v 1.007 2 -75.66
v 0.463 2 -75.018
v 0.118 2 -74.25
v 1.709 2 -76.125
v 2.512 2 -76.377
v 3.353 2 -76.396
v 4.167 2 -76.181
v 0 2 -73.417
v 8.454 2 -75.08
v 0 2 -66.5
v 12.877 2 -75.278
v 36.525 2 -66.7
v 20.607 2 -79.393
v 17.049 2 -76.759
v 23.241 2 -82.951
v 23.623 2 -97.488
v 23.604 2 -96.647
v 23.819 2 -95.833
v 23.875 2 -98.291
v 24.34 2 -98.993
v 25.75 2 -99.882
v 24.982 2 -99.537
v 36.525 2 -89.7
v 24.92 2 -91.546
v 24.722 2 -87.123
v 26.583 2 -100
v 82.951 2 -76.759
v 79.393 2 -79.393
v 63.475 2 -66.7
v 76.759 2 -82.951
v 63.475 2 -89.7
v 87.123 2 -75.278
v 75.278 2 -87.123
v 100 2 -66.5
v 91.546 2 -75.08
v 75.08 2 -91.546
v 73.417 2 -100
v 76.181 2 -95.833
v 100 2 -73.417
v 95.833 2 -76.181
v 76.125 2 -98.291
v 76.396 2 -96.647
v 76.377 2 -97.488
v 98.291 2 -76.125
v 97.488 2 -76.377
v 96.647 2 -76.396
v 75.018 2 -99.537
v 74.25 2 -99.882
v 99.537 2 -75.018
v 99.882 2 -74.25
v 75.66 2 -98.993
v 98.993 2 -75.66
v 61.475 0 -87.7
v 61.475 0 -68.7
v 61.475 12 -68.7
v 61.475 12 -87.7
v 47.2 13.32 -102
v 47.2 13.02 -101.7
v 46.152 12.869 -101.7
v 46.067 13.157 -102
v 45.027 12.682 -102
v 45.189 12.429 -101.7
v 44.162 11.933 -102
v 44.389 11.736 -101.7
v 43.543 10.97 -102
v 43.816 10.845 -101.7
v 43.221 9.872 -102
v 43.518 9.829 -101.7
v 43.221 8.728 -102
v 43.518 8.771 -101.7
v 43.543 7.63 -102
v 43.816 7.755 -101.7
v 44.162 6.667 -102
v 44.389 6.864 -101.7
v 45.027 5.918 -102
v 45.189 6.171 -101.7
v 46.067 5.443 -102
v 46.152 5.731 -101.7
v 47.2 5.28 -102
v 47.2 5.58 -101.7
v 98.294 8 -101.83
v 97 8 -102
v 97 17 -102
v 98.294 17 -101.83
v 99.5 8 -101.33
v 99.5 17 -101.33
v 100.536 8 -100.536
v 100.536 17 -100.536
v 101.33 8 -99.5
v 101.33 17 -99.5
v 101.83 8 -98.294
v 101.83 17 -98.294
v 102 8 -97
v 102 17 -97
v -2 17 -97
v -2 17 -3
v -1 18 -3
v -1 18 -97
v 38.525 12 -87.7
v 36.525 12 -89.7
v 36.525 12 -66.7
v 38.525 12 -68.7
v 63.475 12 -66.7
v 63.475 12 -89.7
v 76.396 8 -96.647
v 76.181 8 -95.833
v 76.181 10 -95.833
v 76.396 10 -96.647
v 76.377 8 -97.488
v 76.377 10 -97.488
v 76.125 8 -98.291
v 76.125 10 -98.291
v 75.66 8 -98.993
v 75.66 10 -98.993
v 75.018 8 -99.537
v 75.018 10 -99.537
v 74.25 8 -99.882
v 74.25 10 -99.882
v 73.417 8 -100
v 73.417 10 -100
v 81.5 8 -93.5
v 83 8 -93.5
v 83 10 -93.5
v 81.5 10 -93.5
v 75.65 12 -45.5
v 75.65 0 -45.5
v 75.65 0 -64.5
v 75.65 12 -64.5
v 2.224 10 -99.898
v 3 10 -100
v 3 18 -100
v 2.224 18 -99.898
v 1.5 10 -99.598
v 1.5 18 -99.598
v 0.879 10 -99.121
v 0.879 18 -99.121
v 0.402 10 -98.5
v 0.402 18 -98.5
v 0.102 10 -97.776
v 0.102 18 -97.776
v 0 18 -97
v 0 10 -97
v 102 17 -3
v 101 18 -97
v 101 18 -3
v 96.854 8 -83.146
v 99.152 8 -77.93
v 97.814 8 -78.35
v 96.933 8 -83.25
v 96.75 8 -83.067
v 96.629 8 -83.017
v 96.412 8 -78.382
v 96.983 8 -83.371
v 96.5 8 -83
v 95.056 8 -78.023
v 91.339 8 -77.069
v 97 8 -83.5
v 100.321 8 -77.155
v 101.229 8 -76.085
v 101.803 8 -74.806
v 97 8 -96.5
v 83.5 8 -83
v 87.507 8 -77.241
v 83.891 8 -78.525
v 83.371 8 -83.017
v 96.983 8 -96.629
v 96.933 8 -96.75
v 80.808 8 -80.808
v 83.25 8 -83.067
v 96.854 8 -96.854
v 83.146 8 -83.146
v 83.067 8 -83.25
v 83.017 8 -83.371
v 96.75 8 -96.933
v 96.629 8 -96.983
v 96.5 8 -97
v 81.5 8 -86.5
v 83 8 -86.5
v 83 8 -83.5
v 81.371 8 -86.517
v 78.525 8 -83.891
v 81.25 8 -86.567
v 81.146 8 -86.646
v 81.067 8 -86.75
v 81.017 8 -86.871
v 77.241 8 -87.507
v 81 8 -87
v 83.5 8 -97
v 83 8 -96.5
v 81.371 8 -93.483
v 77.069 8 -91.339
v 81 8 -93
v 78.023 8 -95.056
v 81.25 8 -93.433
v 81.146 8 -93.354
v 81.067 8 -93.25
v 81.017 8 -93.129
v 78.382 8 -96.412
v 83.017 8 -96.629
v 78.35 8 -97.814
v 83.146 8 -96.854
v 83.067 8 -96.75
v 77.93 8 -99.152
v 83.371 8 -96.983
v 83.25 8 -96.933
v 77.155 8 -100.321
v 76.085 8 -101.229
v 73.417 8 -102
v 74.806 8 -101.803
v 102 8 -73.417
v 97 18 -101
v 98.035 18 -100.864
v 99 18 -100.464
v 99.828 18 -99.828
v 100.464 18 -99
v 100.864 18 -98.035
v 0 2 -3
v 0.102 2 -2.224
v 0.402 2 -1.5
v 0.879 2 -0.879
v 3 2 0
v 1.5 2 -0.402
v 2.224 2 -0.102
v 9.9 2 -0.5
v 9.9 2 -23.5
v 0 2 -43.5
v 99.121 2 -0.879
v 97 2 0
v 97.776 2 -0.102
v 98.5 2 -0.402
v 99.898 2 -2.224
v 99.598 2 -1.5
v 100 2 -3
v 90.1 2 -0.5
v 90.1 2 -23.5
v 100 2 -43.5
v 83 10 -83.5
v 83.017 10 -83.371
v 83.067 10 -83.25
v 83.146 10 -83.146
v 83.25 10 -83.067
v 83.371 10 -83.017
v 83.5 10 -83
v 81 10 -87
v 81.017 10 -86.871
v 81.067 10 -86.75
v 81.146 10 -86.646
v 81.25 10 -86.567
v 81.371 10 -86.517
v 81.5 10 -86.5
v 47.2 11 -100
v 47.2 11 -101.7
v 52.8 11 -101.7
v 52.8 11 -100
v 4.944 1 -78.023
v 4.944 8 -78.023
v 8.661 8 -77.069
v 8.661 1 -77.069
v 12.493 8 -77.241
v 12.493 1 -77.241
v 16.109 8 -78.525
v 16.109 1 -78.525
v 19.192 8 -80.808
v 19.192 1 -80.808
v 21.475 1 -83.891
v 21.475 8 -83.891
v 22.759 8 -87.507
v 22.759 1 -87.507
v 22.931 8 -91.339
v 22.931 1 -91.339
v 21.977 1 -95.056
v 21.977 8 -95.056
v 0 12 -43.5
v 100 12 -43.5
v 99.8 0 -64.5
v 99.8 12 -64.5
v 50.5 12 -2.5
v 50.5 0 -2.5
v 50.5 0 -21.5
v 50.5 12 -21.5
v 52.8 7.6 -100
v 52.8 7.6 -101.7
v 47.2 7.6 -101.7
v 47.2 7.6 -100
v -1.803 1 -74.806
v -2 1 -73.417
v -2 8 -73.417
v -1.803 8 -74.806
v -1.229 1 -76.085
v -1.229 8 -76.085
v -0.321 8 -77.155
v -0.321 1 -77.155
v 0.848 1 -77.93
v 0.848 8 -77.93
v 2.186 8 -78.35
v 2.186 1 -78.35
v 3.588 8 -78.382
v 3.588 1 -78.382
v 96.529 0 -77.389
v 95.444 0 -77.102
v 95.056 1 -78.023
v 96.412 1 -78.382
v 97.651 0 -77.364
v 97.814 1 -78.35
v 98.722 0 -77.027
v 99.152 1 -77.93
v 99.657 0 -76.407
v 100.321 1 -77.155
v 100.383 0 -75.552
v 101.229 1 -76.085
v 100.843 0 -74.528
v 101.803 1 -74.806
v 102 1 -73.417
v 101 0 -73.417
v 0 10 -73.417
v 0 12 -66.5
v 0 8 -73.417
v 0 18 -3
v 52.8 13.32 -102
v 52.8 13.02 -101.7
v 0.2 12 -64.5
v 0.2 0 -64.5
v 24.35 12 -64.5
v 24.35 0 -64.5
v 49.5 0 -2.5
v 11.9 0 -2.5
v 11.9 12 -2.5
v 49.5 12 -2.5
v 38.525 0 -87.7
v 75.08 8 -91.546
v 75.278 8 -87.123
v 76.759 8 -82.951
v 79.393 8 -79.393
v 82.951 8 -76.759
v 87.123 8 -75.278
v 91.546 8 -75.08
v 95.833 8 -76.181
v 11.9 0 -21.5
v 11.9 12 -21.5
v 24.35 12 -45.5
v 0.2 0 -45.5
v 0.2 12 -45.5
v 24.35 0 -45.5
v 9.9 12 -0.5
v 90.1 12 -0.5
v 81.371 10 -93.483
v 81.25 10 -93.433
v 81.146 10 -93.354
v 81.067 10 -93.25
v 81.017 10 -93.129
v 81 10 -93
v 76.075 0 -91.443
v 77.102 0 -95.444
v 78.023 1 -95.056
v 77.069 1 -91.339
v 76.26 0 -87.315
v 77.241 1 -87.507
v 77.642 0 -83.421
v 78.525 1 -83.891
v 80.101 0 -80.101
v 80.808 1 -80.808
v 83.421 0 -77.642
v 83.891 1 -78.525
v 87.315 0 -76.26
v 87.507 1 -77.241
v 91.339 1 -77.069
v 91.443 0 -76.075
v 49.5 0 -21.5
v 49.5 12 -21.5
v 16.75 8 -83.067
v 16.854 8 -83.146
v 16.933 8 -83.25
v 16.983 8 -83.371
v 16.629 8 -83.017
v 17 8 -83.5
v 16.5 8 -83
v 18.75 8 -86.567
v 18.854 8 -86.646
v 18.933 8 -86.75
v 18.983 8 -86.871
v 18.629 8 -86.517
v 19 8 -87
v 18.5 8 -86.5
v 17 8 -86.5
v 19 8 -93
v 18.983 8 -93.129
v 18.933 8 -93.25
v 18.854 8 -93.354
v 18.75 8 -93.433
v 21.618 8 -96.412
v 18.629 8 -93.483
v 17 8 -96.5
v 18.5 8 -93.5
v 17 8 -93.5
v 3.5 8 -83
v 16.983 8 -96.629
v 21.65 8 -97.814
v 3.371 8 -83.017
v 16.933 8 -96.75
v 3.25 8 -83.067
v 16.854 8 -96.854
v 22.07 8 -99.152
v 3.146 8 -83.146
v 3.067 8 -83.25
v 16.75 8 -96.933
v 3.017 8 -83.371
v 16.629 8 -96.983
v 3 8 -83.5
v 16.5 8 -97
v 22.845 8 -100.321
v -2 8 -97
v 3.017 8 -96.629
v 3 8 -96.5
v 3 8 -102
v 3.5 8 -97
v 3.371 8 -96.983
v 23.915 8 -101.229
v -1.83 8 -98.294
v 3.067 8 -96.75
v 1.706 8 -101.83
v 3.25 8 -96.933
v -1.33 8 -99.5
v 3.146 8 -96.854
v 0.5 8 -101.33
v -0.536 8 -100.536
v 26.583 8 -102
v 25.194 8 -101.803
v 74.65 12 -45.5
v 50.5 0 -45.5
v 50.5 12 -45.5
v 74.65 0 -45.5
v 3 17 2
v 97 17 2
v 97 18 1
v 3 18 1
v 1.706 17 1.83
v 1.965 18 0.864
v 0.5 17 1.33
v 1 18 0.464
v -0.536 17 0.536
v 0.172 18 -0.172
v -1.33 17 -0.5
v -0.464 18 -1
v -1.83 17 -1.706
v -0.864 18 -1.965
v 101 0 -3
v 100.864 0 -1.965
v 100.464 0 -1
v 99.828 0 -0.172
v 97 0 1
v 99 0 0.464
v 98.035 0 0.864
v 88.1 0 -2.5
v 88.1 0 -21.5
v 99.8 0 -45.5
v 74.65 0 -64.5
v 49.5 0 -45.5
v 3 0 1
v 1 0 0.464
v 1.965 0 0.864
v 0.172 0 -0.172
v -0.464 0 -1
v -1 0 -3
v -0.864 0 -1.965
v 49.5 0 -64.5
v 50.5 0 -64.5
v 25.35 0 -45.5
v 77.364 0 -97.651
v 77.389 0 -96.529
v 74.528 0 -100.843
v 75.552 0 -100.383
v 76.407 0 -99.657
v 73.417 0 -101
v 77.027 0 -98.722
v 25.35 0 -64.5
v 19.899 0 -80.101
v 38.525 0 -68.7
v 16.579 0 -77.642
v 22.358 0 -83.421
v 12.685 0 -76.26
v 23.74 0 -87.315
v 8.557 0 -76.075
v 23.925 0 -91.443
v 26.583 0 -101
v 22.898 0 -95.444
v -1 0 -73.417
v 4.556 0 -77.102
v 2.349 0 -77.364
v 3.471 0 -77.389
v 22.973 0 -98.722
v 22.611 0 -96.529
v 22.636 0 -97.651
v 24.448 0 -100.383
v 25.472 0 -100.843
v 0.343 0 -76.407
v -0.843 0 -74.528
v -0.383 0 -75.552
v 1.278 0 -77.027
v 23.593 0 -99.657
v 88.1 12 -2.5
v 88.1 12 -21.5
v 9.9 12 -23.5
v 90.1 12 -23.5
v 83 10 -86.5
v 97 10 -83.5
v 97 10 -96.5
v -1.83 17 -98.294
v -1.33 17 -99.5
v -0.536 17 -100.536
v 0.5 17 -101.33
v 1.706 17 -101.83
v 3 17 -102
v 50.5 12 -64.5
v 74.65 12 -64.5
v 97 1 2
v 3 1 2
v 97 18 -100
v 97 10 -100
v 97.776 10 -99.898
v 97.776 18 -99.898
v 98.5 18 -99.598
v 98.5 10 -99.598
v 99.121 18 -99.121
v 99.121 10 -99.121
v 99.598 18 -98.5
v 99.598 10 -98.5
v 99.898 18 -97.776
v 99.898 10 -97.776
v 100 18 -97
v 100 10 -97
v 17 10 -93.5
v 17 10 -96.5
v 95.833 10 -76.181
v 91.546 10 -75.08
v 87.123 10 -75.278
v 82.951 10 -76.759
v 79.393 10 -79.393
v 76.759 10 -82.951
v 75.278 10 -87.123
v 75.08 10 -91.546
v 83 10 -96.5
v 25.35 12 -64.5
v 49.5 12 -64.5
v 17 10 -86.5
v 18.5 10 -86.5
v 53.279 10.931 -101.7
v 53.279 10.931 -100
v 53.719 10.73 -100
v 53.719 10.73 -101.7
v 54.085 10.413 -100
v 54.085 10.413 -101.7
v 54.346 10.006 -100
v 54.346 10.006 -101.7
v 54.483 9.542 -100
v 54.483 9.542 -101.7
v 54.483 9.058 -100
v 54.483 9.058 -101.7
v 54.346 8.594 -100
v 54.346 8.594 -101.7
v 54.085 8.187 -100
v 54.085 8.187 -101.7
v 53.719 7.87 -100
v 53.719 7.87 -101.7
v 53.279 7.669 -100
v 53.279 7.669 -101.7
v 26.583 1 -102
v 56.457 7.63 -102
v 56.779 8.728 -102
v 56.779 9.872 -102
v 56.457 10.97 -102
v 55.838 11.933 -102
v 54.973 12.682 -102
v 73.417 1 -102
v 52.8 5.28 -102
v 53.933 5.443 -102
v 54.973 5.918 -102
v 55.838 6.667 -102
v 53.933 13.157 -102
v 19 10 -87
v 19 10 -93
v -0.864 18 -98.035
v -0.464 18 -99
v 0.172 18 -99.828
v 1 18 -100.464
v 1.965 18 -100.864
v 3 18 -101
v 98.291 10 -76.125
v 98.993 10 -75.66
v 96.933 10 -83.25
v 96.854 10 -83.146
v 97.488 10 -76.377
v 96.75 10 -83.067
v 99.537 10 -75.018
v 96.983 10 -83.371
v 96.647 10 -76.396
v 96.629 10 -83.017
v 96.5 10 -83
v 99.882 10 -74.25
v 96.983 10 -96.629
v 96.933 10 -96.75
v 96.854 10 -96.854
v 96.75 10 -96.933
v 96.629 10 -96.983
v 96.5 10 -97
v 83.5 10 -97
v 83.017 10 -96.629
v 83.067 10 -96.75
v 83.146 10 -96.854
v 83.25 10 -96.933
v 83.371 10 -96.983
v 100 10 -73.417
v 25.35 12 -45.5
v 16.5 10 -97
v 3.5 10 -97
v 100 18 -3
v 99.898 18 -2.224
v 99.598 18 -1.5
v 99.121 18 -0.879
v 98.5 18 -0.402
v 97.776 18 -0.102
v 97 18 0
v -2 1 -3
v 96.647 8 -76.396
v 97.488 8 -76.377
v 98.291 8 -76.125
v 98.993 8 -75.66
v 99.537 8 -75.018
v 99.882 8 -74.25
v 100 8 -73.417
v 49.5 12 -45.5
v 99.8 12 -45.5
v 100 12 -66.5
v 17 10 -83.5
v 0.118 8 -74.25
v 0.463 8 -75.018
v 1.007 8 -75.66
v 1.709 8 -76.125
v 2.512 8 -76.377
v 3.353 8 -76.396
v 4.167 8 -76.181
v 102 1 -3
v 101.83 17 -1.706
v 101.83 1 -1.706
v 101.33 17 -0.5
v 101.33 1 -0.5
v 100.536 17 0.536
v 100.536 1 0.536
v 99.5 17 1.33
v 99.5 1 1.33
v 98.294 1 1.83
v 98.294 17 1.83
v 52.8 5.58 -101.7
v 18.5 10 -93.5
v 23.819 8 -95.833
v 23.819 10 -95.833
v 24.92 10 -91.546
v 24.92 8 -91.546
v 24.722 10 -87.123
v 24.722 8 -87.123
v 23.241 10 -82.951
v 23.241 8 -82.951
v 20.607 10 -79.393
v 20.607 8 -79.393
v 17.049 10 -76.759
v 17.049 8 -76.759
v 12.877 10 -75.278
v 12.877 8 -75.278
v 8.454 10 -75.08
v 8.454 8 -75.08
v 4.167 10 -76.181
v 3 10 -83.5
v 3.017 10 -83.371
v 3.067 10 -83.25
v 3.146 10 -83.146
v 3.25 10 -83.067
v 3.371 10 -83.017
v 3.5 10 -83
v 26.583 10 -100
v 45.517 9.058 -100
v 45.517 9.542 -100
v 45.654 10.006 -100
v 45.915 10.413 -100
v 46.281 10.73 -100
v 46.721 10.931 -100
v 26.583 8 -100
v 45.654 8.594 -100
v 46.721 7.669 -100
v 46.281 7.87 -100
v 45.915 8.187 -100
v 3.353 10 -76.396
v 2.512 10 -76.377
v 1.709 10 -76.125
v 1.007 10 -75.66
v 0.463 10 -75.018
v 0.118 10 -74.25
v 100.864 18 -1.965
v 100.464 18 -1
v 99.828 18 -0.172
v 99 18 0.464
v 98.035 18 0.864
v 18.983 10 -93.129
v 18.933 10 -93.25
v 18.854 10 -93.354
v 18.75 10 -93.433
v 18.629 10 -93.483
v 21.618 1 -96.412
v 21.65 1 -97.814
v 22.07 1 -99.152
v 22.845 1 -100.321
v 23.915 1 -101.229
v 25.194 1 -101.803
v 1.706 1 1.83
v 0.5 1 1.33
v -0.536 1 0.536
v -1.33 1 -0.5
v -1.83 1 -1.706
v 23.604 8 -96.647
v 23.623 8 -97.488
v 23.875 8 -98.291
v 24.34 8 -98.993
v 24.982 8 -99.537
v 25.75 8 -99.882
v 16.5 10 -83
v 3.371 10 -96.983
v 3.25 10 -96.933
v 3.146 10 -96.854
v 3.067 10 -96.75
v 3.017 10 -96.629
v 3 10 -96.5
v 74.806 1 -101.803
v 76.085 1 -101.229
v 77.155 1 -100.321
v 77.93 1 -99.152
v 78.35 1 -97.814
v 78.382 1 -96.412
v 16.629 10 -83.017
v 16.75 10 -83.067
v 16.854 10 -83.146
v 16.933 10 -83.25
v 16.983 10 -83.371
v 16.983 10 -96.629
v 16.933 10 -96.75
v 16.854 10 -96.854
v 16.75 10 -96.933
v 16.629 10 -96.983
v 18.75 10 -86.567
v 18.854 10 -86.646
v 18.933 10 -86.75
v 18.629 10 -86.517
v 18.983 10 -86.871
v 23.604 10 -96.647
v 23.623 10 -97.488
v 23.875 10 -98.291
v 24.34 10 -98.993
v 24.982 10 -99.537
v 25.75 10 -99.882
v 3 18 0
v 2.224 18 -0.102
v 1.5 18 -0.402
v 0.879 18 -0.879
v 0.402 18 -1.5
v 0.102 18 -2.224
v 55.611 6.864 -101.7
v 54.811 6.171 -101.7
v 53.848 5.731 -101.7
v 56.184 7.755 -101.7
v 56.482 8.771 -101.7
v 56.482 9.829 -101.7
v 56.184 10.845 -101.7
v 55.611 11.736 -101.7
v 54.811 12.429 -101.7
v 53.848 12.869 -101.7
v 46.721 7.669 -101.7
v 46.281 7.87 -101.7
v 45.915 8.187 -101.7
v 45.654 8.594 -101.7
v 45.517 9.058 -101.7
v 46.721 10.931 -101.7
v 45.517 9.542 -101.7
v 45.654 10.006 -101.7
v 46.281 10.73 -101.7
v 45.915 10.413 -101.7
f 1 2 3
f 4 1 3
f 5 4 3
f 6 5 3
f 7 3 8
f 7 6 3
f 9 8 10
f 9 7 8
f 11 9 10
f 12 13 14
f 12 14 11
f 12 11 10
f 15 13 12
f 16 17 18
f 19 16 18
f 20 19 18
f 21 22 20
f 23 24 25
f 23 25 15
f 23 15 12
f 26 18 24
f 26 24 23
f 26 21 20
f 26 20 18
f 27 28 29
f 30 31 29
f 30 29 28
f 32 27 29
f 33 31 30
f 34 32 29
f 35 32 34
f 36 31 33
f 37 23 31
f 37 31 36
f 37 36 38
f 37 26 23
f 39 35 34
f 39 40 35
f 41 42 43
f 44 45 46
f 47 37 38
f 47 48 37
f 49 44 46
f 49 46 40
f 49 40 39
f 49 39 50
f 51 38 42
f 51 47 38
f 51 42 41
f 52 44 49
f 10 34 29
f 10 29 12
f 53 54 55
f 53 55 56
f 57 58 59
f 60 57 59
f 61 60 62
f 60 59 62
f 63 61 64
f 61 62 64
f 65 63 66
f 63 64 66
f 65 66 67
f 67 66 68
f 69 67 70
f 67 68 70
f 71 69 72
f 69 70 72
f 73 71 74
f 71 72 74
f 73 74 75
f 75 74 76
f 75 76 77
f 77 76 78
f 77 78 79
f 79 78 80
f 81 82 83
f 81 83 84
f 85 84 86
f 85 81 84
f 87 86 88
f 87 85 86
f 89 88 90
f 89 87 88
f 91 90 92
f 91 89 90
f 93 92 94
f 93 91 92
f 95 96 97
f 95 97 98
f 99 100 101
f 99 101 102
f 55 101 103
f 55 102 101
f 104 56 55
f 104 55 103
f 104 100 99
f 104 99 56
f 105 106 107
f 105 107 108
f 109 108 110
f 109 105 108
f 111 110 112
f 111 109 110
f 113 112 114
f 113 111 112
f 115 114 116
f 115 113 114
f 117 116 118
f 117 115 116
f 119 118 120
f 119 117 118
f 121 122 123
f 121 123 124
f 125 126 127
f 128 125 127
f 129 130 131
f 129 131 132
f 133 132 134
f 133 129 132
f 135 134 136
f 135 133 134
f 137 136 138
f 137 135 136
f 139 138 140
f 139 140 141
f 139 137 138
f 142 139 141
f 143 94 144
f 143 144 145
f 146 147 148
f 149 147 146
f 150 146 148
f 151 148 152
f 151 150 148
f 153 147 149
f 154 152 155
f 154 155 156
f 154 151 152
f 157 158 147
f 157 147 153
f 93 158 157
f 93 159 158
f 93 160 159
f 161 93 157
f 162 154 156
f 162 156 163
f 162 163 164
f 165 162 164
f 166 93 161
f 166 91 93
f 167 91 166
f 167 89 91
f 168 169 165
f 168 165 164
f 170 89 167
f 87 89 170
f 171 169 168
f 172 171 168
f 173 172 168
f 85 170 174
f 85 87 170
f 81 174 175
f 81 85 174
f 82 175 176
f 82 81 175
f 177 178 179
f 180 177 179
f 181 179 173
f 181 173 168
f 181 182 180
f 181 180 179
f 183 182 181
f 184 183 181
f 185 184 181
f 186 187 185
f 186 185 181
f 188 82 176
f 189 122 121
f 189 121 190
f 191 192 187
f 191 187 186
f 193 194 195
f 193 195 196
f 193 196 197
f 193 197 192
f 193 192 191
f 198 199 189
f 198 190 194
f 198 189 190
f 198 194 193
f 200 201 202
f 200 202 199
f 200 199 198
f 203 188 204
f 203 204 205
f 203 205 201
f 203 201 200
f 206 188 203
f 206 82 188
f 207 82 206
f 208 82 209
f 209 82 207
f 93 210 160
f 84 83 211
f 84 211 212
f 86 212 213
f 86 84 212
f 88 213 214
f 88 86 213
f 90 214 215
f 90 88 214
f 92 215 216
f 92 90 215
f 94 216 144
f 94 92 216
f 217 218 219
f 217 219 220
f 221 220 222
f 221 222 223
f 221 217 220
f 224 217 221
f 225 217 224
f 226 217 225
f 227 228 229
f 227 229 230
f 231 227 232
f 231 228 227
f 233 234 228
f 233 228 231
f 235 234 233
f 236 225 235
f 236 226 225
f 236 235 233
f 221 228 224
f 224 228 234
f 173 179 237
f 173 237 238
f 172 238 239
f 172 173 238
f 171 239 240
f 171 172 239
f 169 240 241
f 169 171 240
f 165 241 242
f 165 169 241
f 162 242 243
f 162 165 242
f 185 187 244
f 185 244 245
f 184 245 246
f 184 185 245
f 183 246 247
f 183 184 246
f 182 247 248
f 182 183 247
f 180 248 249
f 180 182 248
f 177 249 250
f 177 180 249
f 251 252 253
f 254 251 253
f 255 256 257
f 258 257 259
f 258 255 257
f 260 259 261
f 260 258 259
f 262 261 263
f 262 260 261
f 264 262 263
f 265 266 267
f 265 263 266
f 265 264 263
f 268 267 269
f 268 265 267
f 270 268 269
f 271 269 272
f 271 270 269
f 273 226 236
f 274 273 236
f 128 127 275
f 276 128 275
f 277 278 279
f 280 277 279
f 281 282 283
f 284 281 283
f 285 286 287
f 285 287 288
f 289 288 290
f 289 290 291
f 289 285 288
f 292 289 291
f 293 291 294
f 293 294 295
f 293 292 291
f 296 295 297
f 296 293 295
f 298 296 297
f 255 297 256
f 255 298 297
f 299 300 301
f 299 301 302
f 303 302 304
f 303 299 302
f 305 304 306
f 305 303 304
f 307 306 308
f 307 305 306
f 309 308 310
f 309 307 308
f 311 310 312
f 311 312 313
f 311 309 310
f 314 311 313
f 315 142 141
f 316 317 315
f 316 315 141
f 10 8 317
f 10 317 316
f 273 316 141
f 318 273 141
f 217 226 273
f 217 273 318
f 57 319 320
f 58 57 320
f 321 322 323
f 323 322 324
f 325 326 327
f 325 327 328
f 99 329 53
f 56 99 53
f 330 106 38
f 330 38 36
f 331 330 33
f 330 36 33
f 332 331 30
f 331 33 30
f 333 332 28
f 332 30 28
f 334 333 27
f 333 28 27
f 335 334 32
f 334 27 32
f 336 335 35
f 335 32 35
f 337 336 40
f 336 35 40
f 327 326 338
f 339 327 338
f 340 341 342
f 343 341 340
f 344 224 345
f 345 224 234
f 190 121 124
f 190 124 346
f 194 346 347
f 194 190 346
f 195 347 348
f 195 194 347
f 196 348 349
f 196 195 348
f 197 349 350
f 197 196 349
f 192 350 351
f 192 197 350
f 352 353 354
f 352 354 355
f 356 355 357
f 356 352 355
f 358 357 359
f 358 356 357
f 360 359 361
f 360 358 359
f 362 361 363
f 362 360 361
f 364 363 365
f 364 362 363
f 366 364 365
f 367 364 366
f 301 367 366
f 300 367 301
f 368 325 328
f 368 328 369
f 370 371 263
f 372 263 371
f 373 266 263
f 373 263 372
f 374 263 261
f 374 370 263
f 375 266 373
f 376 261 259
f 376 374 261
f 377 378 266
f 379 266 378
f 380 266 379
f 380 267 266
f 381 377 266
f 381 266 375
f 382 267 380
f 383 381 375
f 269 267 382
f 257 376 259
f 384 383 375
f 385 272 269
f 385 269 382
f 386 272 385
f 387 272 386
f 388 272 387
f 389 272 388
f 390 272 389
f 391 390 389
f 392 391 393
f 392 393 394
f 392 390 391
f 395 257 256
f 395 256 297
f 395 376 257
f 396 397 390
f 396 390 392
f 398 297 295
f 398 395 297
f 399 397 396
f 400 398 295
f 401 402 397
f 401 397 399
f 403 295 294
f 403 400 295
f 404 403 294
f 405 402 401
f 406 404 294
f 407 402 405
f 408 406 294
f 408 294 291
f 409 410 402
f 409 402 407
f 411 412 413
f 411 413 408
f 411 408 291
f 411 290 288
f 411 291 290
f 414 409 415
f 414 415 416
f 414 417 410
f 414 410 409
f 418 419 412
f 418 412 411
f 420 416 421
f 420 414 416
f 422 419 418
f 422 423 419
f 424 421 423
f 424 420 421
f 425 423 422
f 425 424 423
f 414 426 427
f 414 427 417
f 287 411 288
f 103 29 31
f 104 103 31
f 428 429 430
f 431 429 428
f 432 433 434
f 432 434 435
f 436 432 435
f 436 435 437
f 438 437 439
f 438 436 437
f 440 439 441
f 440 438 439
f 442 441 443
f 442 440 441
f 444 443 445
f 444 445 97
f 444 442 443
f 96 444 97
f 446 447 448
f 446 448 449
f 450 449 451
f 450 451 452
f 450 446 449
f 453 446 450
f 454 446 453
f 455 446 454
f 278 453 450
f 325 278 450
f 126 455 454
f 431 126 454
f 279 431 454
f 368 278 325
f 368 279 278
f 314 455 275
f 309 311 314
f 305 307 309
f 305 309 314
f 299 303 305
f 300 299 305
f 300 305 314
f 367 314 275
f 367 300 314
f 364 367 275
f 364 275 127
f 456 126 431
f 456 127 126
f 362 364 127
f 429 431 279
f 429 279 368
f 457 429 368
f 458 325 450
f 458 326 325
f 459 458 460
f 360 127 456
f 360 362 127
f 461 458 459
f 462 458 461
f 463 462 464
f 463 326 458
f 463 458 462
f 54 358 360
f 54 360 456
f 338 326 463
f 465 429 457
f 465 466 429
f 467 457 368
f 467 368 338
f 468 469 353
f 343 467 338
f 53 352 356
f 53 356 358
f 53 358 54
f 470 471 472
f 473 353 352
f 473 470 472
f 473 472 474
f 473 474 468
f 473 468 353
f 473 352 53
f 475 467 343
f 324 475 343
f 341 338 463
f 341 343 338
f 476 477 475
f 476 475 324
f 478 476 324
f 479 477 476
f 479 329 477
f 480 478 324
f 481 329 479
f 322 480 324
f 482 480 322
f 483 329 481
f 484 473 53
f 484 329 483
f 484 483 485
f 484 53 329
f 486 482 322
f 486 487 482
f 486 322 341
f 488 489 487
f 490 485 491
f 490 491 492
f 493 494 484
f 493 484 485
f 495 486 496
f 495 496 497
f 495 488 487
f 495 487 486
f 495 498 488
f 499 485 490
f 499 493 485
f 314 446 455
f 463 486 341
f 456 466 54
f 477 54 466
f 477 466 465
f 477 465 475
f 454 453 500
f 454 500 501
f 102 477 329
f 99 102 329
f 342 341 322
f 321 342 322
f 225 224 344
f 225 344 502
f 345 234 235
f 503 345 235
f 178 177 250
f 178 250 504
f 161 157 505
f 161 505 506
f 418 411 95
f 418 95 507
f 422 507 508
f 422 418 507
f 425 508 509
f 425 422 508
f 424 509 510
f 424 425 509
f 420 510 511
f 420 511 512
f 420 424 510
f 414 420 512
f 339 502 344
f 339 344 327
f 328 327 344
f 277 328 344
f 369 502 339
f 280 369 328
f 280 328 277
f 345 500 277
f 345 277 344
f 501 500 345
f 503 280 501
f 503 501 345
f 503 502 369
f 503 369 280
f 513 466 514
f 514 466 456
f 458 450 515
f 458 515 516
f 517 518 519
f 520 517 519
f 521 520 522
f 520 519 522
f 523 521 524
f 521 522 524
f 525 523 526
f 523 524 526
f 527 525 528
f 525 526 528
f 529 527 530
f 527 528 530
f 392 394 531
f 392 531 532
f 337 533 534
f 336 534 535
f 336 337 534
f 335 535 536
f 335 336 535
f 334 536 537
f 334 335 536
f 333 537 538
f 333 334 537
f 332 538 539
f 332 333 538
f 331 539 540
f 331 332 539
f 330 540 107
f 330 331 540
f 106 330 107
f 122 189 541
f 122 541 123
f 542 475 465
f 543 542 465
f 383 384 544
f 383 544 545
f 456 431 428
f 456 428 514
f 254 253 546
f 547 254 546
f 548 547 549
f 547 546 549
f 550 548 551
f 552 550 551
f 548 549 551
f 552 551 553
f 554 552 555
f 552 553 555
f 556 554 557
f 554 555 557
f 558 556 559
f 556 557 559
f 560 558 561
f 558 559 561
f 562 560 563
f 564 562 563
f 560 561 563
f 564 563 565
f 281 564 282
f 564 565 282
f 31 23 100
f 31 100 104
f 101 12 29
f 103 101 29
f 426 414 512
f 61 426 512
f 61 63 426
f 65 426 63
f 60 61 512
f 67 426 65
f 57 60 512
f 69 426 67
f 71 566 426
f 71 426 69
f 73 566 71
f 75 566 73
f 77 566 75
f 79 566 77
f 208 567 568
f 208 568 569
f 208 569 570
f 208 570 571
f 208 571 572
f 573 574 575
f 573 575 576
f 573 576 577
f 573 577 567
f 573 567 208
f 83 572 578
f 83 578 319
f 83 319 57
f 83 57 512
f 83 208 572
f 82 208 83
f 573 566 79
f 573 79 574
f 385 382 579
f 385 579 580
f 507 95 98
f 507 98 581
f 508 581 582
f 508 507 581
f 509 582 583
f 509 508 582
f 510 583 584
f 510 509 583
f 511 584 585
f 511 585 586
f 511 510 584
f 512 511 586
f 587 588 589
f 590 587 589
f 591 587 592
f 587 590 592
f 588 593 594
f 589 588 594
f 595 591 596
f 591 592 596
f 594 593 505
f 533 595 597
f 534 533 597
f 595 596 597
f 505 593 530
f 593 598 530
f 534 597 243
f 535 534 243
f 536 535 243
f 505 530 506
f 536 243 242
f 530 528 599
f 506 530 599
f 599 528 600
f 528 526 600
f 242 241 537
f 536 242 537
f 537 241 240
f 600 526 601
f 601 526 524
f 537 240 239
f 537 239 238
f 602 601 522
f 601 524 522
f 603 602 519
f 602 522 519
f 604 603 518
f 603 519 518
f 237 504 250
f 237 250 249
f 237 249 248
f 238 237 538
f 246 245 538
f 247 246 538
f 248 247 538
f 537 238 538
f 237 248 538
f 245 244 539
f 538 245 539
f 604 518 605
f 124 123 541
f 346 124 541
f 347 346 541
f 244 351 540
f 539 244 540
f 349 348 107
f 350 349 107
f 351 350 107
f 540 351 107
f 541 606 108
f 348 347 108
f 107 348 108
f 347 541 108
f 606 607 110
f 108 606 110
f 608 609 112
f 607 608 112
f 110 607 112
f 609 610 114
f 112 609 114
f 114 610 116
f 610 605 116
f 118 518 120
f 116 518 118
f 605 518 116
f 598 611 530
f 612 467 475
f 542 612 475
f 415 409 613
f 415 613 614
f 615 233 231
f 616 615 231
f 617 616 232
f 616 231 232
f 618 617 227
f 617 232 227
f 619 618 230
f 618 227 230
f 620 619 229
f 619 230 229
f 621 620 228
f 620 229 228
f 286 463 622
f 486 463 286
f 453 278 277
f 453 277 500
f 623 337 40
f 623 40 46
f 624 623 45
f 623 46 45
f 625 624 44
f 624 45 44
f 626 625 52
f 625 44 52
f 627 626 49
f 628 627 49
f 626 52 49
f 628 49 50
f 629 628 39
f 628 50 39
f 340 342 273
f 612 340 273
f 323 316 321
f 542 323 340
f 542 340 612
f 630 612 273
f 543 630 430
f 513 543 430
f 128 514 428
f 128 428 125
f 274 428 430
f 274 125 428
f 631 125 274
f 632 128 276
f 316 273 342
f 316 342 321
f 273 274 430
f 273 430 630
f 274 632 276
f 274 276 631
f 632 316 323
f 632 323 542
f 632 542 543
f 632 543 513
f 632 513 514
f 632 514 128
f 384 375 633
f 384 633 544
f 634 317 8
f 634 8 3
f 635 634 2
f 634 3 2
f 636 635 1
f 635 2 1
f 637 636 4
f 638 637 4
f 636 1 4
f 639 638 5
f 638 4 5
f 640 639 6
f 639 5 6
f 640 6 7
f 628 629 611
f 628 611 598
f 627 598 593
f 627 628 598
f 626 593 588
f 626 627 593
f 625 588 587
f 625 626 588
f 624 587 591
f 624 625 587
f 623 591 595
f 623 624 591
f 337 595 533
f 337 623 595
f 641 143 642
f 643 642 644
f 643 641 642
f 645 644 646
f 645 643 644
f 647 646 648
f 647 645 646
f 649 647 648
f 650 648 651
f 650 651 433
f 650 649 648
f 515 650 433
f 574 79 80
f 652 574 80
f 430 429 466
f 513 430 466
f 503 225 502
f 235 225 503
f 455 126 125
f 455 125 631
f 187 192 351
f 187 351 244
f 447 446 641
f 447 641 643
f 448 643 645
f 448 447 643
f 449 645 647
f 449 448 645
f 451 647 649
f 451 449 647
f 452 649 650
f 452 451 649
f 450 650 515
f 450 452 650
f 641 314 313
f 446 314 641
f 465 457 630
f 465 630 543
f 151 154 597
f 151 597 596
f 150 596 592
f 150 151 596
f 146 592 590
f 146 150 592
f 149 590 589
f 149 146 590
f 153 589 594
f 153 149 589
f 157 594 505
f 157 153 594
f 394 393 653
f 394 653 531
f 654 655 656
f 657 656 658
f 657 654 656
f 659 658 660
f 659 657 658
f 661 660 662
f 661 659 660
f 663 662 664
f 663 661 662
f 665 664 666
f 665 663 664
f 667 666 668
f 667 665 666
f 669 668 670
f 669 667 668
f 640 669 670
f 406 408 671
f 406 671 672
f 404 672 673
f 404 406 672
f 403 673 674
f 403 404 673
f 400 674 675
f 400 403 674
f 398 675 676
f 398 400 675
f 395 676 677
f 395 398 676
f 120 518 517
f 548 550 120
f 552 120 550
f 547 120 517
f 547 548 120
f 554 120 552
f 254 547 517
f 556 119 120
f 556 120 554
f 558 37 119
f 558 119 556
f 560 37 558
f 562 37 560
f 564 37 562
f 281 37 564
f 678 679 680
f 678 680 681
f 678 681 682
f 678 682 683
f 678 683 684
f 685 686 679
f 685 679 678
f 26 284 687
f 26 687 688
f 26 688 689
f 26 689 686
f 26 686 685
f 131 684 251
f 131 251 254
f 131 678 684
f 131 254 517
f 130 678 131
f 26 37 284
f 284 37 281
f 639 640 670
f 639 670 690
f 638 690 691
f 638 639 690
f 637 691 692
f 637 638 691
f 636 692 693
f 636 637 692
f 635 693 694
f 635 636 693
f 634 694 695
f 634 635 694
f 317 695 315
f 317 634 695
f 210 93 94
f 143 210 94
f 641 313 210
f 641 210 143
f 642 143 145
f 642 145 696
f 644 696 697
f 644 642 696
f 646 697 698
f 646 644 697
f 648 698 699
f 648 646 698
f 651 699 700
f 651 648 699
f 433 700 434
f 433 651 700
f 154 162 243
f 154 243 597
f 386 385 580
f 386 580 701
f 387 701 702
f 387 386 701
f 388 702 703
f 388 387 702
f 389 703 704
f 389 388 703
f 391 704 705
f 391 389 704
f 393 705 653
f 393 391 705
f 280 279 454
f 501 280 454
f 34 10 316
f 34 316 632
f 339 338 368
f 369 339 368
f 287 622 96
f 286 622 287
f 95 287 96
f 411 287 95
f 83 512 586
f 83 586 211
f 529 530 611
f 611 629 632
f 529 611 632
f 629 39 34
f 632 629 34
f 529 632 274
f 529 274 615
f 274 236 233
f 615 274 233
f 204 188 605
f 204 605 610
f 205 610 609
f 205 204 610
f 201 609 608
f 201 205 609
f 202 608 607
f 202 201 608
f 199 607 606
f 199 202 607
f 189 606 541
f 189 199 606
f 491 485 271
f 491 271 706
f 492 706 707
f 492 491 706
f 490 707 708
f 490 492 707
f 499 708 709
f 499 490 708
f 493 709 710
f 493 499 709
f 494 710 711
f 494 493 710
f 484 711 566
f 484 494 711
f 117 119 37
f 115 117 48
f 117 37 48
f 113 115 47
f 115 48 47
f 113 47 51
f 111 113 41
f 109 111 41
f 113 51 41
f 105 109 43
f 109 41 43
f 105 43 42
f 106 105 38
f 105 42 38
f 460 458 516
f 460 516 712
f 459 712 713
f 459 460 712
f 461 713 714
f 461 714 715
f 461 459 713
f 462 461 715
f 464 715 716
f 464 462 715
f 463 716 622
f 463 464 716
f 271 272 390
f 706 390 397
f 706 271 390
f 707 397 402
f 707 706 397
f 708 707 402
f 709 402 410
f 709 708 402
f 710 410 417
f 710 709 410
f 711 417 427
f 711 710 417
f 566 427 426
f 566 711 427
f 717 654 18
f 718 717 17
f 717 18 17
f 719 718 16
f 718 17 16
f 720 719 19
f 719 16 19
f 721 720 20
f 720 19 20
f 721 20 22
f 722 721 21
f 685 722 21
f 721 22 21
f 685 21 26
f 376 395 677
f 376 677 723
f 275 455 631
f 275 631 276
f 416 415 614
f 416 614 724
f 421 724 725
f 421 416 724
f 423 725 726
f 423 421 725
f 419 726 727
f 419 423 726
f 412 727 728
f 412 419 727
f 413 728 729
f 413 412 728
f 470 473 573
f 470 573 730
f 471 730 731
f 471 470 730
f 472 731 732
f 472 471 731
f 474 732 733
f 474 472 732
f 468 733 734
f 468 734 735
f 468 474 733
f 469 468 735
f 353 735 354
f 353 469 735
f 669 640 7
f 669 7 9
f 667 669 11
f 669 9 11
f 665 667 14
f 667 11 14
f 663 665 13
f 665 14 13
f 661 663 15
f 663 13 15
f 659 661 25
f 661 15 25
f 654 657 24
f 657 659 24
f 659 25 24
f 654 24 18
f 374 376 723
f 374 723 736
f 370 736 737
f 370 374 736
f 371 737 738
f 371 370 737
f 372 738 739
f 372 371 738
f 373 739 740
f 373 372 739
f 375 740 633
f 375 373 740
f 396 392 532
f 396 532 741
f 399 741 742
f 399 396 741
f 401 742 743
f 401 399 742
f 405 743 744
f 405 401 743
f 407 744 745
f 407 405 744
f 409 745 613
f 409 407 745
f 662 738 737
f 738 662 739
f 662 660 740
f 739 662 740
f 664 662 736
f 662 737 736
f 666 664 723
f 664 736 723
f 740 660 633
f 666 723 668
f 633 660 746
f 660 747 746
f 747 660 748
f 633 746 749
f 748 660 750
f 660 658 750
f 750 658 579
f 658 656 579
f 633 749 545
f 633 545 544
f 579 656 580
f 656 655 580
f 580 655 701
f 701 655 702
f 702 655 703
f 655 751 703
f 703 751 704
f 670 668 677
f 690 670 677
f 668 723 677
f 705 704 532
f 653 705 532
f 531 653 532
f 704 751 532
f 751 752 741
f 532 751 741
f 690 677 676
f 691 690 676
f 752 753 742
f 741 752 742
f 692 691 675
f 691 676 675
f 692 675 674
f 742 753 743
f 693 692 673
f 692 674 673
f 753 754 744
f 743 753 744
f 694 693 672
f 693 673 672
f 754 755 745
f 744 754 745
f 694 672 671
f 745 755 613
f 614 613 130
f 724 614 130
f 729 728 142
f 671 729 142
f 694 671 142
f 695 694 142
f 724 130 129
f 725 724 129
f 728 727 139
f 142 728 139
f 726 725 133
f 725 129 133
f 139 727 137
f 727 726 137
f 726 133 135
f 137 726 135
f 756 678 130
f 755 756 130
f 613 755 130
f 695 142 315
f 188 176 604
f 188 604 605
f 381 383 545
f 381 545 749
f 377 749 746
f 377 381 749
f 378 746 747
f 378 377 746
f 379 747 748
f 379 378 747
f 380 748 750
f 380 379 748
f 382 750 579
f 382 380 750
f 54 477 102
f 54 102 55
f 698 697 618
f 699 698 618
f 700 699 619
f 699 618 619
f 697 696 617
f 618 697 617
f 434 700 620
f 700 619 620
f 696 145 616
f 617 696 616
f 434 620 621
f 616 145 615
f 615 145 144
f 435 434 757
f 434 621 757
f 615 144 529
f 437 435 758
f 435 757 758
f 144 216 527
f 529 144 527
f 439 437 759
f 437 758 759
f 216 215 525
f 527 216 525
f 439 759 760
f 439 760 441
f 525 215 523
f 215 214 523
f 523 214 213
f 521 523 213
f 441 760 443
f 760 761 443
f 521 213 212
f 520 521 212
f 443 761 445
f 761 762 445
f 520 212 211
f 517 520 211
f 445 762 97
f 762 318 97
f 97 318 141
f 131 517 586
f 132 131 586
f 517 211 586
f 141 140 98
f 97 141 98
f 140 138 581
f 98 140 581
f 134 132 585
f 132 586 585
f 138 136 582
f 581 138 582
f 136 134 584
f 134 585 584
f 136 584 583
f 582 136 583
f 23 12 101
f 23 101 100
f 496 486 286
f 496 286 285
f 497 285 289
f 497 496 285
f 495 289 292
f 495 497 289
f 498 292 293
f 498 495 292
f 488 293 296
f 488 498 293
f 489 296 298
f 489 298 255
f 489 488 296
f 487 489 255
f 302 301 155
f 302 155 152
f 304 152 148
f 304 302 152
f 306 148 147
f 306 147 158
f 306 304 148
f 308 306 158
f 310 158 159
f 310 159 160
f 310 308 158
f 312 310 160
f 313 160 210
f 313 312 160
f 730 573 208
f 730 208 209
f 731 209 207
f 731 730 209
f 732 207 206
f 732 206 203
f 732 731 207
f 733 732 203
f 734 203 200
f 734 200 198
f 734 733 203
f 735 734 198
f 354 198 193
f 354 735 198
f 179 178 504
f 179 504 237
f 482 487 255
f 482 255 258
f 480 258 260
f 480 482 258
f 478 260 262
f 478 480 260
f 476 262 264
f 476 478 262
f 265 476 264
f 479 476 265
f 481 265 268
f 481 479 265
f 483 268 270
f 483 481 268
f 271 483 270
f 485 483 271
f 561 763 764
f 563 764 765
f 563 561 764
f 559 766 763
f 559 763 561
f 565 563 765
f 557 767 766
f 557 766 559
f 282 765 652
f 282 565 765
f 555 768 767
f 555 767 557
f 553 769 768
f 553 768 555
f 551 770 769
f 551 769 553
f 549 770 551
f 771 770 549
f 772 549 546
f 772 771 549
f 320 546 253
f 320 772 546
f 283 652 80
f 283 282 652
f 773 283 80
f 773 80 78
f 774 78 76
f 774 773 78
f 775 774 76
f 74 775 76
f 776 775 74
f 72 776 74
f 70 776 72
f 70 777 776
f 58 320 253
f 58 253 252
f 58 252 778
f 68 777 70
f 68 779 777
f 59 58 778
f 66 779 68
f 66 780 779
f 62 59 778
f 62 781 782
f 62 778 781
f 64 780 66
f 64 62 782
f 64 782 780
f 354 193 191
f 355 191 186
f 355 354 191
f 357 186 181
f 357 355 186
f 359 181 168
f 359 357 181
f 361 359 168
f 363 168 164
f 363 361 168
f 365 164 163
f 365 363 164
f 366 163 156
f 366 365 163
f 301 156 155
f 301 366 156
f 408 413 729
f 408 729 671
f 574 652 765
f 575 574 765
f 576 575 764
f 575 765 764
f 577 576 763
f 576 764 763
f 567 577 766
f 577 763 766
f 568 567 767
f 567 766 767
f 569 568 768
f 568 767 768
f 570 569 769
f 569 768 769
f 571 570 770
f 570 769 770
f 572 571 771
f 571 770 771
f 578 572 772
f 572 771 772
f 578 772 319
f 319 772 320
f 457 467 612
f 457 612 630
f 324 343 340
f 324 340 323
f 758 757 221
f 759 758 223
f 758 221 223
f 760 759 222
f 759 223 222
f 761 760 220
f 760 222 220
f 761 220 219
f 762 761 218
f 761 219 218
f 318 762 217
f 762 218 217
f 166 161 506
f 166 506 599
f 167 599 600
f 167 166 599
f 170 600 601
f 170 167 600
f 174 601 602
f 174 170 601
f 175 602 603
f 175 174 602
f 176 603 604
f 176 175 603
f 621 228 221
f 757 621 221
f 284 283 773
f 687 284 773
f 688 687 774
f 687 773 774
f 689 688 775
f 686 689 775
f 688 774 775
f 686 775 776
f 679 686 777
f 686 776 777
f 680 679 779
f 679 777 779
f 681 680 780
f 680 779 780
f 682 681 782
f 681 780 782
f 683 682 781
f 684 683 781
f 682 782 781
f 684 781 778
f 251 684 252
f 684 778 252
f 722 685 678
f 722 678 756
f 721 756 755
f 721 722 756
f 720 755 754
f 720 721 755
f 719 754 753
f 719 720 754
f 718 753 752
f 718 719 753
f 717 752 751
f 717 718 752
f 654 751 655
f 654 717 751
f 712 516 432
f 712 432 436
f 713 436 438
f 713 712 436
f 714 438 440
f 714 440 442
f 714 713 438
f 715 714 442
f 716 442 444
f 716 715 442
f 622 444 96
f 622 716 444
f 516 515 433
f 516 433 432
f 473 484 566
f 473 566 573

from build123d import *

# Parameters (mm, degrees)
SKETCH_1_W            = 22.95
SKETCH_1_H            = 19
SKETCH_1_W_2          = 37.6
SKETCH_1_W_3          = 24.15
EXTRUDE_7_DEPTH       = 2
SKETCH_4_R            = 15
CUT_EXTRUDE_1_DEPTH   = 18
FILLET_1_R            = 3
FILLET_2_R            = 3
SKETCH_1_6_W          = 26.95
SKETCH_1_6_H          = 23
SKETCH_1_6_W_2        = 22.95
SKETCH_1_6_H_2        = 19
EXTRUDE_3_DEPTH       = 12
EXTRUDE_4_OUTLINE_W   = 103.6
EXTRUDE_4_OUTLINE_H   = 23
EXTRUDE_4_OUTLINE_W_2 = 23.15
EXTRUDE_4_OUTLINE_H_2 = 19
EXTRUDE_4_OUTLINE_W_3 = 22.15
EXTRUDE_4_DEPTH       = 12
EXTRUDE_5_OUTLINE_W   = 80.2
EXTRUDE_5_OUTLINE_H   = 23
EXTRUDE_5_OUTLINE_W_2 = 36.6
EXTRUDE_5_OUTLINE_H_2 = 19
EXTRUDE_5_DEPTH       = 12
EXTRUDE_START         = -2
EXTRUDE_7_2_DEPTH     = 18
SKETCH_11_W           = 28.583123952
SKETCH_11_H           = 28.583123952
CUT_EXTRUDE_8_DEPTH   = 10
EXTRUDE_8_DEPTH       = 2
EXTRUDE_9_DEPTH       = 2
EXTRUDE_12_DEPTH      = 8
CHAMFER_1_SIZE        = 1
CHAMFER_2_SIZE        = 1
CUT_EXTRUDE_9_DEPTH   = 2
CUT_EXTRUDE_10_DEPTH  = 0.3
CHAMFER_3_SIZE        = 0.32
SKETCH_1_11_W         = 37.6
SKETCH_1_11_H         = 19
SKETCH_1_11_W_2       = 24.15
CUT_EXTRUDE_12_DEPTH  = 12


# Read off the part's stored shape, not the designer's step: 拉伸-薄壁4, 拉伸-薄壁5
with BuildPart() as part:
    # 草图1 → Extrude 7 (new body)
    with BuildSketch(Plane(origin=(0, 0, 0), x_dir=(1, 0, 0), z_dir=(0, 1, 0))):
        with BuildLine():
            Line((3, 0), (97, 0))
            ThreePointArc((97, 0), (99.121320344, 0.878679656), (100, 3))
            Line((100, 3), (100, 97))
            ThreePointArc((100, 97), (99.121320344, 99.121320344), (97, 100))
            Line((97, 100), (3, 100))
            ThreePointArc((3, 100), (0.878679656, 99.121320344), (0, 97))
            Line((0, 97), (0, 3))
            ThreePointArc((0, 3), (0.878679656, 0.878679656), (3, 0))
        make_face()
        with Locations((50, 78.2)):
            Rectangle(SKETCH_1_W, SKETCH_1_H, mode=Mode.SUBTRACT)
        with Locations((30.7, 12)):
            Rectangle(SKETCH_1_W_2, SKETCH_1_H, mode=Mode.SUBTRACT)
        with Locations((87.725, 55)):
            Rectangle(SKETCH_1_W_3, SKETCH_1_H, mode=Mode.SUBTRACT)
        with Locations((37.425, 55)):
            Rectangle(SKETCH_1_W_3, SKETCH_1_H, mode=Mode.SUBTRACT)
        with Locations((62.575, 55)):
            Rectangle(SKETCH_1_W_3, SKETCH_1_H, mode=Mode.SUBTRACT)
        with Locations((12.275, 55)):
            Rectangle(SKETCH_1_W_3, SKETCH_1_H, mode=Mode.SUBTRACT)
        with Locations((69.3, 12)):
            Rectangle(SKETCH_1_W_2, SKETCH_1_H, mode=Mode.SUBTRACT)
    extrude(amount=EXTRUDE_7_DEPTH)

    # 草图4 → 切除-拉伸1 (cut)
    with BuildSketch(Plane(origin=(0, 2, 0), x_dir=(1, 0, 0), z_dir=(0, 1, 0))):
        with Locations((10, 90)):
            Circle(SKETCH_4_R)
        with Locations((90, 90)):
            Circle(SKETCH_4_R)
    extrude(amount=-CUT_EXTRUDE_1_DEPTH, mode=Mode.SUBTRACT)

    # 圆角1
    fillet_1_edges = [part.edges().sort_by_distance(p)[0] for p in [
        (21.180339887, 1, -100),
        (0, 1, -78.819660113),
    ]]
    fillet(fillet_1_edges, radius=FILLET_1_R)

    # 圆角2
    fillet_2_edges = [part.edges().sort_by_distance(p)[0] for p in [
        (78.819660113, 1, -100),
        (100, 1, -78.819660113),
    ]]
    fillet(fillet_2_edges, radius=FILLET_2_R)

    # 草图1<6> → 拉伸-薄壁3 (add)
    with BuildSketch(Plane(origin=(0, 0, 0), x_dir=(1, 0, 0), z_dir=(0, 1, 0))):
        with Locations((50, 78.2)):
            Rectangle(SKETCH_1_6_W, SKETCH_1_6_H)
        with Locations((50, 78.2)):
            Rectangle(SKETCH_1_6_W_2, SKETCH_1_6_H_2, mode=Mode.SUBTRACT)
    extrude(amount=EXTRUDE_3_DEPTH)

    # 拉伸-薄壁4 outline → 拉伸-薄壁4 (add)
    with BuildSketch(Plane(origin=(0, 0, 0), x_dir=(1, 0, 0), z_dir=(0, 1, 0))):
        with Locations((50, 55)):
            Rectangle(EXTRUDE_4_OUTLINE_W, EXTRUDE_4_OUTLINE_H)
        with Locations((11.775, 55)):
            Rectangle(EXTRUDE_4_OUTLINE_W_2, EXTRUDE_4_OUTLINE_H_2, mode=Mode.SUBTRACT)
        with Locations((37.425, 55)):
            Rectangle(EXTRUDE_4_OUTLINE_W_3, EXTRUDE_4_OUTLINE_H_2, mode=Mode.SUBTRACT)
        with Locations((62.575, 55)):
            Rectangle(EXTRUDE_4_OUTLINE_W_3, EXTRUDE_4_OUTLINE_H_2, mode=Mode.SUBTRACT)
        with Locations((88.225, 55)):
            Rectangle(EXTRUDE_4_OUTLINE_W_2, EXTRUDE_4_OUTLINE_H_2, mode=Mode.SUBTRACT)
    extrude(amount=EXTRUDE_4_DEPTH)

    # 拉伸-薄壁5 outline → 拉伸-薄壁5 (add)
    with BuildSketch(Plane(origin=(0, 0, 0), x_dir=(1, 0, 0), z_dir=(0, 1, 0))):
        with Locations((50, 12)):
            Rectangle(EXTRUDE_5_OUTLINE_W, EXTRUDE_5_OUTLINE_H)
        with Locations((30.2, 12)):
            Rectangle(EXTRUDE_5_OUTLINE_W_2, EXTRUDE_5_OUTLINE_H_2, mode=Mode.SUBTRACT)
        with Locations((69.8, 12)):
            Rectangle(EXTRUDE_5_OUTLINE_W_2, EXTRUDE_5_OUTLINE_H_2, mode=Mode.SUBTRACT)
    extrude(amount=EXTRUDE_5_DEPTH)

    # 草图10 → Extrude 7 2 (add)
    with BuildSketch(Plane(origin=(0, 2, 0), x_dir=(1, 0, 0), z_dir=(0, 1, 0)).offset(EXTRUDE_START)):
        with BuildLine():
            Line((-2, 3), (-2, 73.416876048))
            ThreePointArc((-2, 73.416876048), (0.236146008, 77.583542715), (4.944444444, 78.023299368))
            ThreePointArc((4.944444444, 78.023299368), (19.192388155, 80.807611845), (21.976700632, 95.055555556))
            ThreePointArc((21.976700632, 95.055555556), (22.416457285, 99.763853992), (26.583123952, 102))
            Line((26.583123952, 102), (73.416876048, 102))
            ThreePointArc((73.416876048, 102), (77.583542715, 99.763853992), (78.023299368, 95.055555556))
            ThreePointArc((78.023299368, 95.055555556), (80.807611845, 80.807611845), (95.055555556, 78.023299368))
            ThreePointArc((95.055555556, 78.023299368), (99.763853992, 77.583542715), (102, 73.416876048))
            Line((102, 73.416876048), (102, 3))
            ThreePointArc((102, 3), (100.535533906, -0.535533906), (97, -2))
            Line((97, -2), (3, -2))
            ThreePointArc((3, -2), (-0.535533906, -0.535533906), (-2, 3))
        make_face()
        with BuildLine():
            Line((0, 3), (0, 73.416876048))
            ThreePointArc((0, 73.416876048), (1.341687605, 75.916876048), (4.166666667, 76.18073004))
            ThreePointArc((4.166666667, 76.18073004), (20.606601718, 79.393398282), (23.81926996, 95.833333333))
            ThreePointArc((23.81926996, 95.833333333), (24.083123952, 98.658312395), (26.583123952, 100))
            Line((26.583123952, 100), (73.416876048, 100))
            ThreePointArc((73.416876048, 100), (75.916876048, 98.658312395), (76.18073004, 95.833333333))
            ThreePointArc((76.18073004, 95.833333333), (79.393398282, 79.393398282), (95.833333333, 76.18073004))
            ThreePointArc((95.833333333, 76.18073004), (98.658312395, 75.916876048), (100, 73.416876048))
            Line((100, 73.416876048), (100, 3))
            ThreePointArc((100, 3), (99.121320344, 0.878679656), (97, 0))
            Line((97, 0), (3, 0))
            ThreePointArc((3, 0), (0.878679656, 0.878679656), (0, 3))
        make_face(mode=Mode.SUBTRACT)
    extrude(amount=EXTRUDE_7_2_DEPTH)

    # 草图11 → 切除-拉伸8 (cut)
    with BuildSketch(Plane(origin=(0, 18, 0), x_dir=(1, 0, 0), z_dir=(0, 1, 0))):
        with Locations((87.708438024, 87.708438024)):
            Rectangle(SKETCH_11_W, SKETCH_11_H)
        with Locations((12.291561976, 87.708438024)):
            Rectangle(SKETCH_11_W, SKETCH_11_H)
    extrude(amount=-CUT_EXTRUDE_8_DEPTH, mode=Mode.SUBTRACT)

    # 草图13 → 凸台-拉伸8 (add)
    with BuildSketch(Plane(origin=(0, 8, 0), x_dir=(1, 0, 0), z_dir=(0, 1, 0))):
        with BuildLine():
            Line((26.583123952, 102), (26.583123952, 100))
            ThreePointArc((26.583123952, 100), (24.083123952, 98.658312395), (23.81926996, 95.833333333))
            ThreePointArc((23.81926996, 95.833333333), (20.606601718, 79.393398282), (4.166666667, 76.18073004))
            ThreePointArc((4.166666667, 76.18073004), (1.341687605, 75.916876048), (0, 73.416876048))
            Line((0, 73.416876048), (-2, 73.416876048))
            Line((-2, 73.416876048), (-2, 97))
            ThreePointArc((-2, 97), (-0.535533906, 100.535533906), (3, 102))
            Line((3, 102), (26.583123952, 102))
        make_face()
        with BuildLine():
            Line((18.5, 93.5), (17, 93.5))
            Line((17, 93.5), (17, 96.5))
            ThreePointArc((17, 96.5), (16.853553391, 96.853553391), (16.5, 97))
            Line((16.5, 97), (3.5, 97))
            ThreePointArc((3.5, 97), (3.146446609, 96.853553391), (3, 96.5))
            Line((3, 96.5), (3, 83.5))
            ThreePointArc((3, 83.5), (3.146446609, 83.146446609), (3.5, 83))
            Line((3.5, 83), (16.5, 83))
            ThreePointArc((16.5, 83), (16.853553391, 83.146446609), (17, 83.5))
            Line((17, 83.5), (17, 86.5))
            Line((17, 86.5), (18.5, 86.5))
            ThreePointArc((18.5, 86.5), (18.853553391, 86.646446609), (19, 87))
            Line((19, 87), (19, 93))
            ThreePointArc((19, 93), (18.853553391, 93.353553391), (18.5, 93.5))
        make_face(mode=Mode.SUBTRACT)
    extrude(amount=EXTRUDE_8_DEPTH)

    # 草图15 → 凸台-拉伸9 (add)
    with BuildSketch(Plane(origin=(0, 8, 0), x_dir=(1, 0, 0), z_dir=(0, 1, 0))):
        with BuildLine():
            Line((73.416876048, 102), (97, 102))
            ThreePointArc((97, 102), (100.535533906, 100.535533906), (102, 97))
            Line((102, 97), (102, 73.416876048))
            Line((102, 73.416876048), (100, 73.416876048))
            ThreePointArc((100, 73.416876048), (98.658312395, 75.916876048), (95.833333333, 76.18073004))
            ThreePointArc((95.833333333, 76.18073004), (79.393398282, 79.393398282), (76.18073004, 95.833333333))
            ThreePointArc((76.18073004, 95.833333333), (75.916876048, 98.658312395), (73.416876048, 100))
            Line((73.416876048, 100), (73.416876048, 102))
        make_face()
        with BuildLine():
            Line((83, 86.5), (83, 83.5))
            ThreePointArc((83, 83.5), (83.146446609, 83.146446609), (83.5, 83))
            Line((83.5, 83), (96.5, 83))
            ThreePointArc((96.5, 83), (96.853553391, 83.146446609), (97, 83.5))
            Line((97, 83.5), (97, 96.5))
            ThreePointArc((97, 96.5), (96.853553391, 96.853553391), (96.5, 97))
            Line((96.5, 97), (83.5, 97))
            ThreePointArc((83.5, 97), (83.146446609, 96.853553391), (83, 96.5))
            Line((83, 96.5), (83, 93.5))
            Line((83, 93.5), (81.5, 93.5))
            ThreePointArc((81.5, 93.5), (81.146446609, 93.353553391), (81, 93))
            Line((81, 93), (81, 87))
            ThreePointArc((81, 87), (81.146446609, 86.646446609), (81.5, 86.5))
            Line((81.5, 86.5), (83, 86.5))
        make_face(mode=Mode.SUBTRACT)
    extrude(amount=EXTRUDE_9_DEPTH)

    # 草图18 → 凸台-拉伸12 (add)
    with BuildSketch(Plane(origin=(0, 10, 0), x_dir=(1, 0, 0), z_dir=(0, 1, 0))):
        with BuildLine():
            Line((0, 73.416876048), (-2, 73.416876048))
            Line((-2, 73.416876048), (-2, 97))
            ThreePointArc((-2, 97), (-0.535533906, 100.535533906), (3, 102))
            Line((3, 102), (26.583123952, 102))
            Line((26.583123952, 102), (26.583123952, 100))
            Line((26.583123952, 100), (3, 100))
            ThreePointArc((3, 100), (0.878679656, 99.121320344), (0, 97))
            Line((0, 97), (0, 73.416876048))
        make_face()
        with BuildLine():
            Line((73.416876048, 102), (73.416876048, 100))
            Line((73.416876048, 100), (97, 100))
            ThreePointArc((97, 100), (99.121320344, 99.121320344), (100, 97))
            Line((100, 97), (100, 73.416876048))
            Line((100, 73.416876048), (102, 73.416876048))
            Line((102, 73.416876048), (102, 97))
            ThreePointArc((102, 97), (100.535533906, 100.535533906), (97, 102))
            Line((97, 102), (73.416876048, 102))
        make_face()
    extrude(amount=EXTRUDE_12_DEPTH)

    # 倒角1
    chamfer_1_edges = [part.edges().sort_by_distance(p)[0] for p in [
        (80.807611845, 0, -80.807611845),
        (19.192388155, 0, -80.807611845),
        (50, 0, 2),
        (-0.535533906, 0, 0.535533906),
        (-2, 0, -38.208438024),
        (0.236146008, 0, -77.583542715),
        (22.416457285, 0, -99.763853992),
        (50, 0, -102),
        (77.583542715, 0, -99.763853992),
        (99.763853992, 0, -77.583542715),
        (102, 0, -38.208438024),
        (100.535533906, 0, 0.535533906),
    ]]
    chamfer(chamfer_1_edges, length=CHAMFER_1_SIZE)

    # 倒角2
    chamfer_2_edges = [part.edges().sort_by_distance(p)[0] for p in [
        (50, 18, 2),
        (100.535533906, 18, 0.535533906),
        (102, 18, -50),
        (50, 18, -102),
        (-2, 18, -50),
        (-0.535533906, 18, 0.535533906),
        (100.535533906, 18, -100.535533906),
        (-0.535533906, 18, -100.535533906),
    ]]
    chamfer(chamfer_2_edges, length=CHAMFER_2_SIZE)

    # 草图20 → 切除-拉伸9 (cut)
    with BuildSketch(Plane(origin=(0, 0, -102), x_dir=(-1, 0, 0), z_dir=(0, 0, -1))):
        with BuildLine():
            Line((-52.8, 7.6), (-47.2, 7.6))
            ThreePointArc((-47.2, 7.6), (-45.5, 9.3), (-47.2, 11))
            Line((-47.2, 11), (-52.8, 11))
            ThreePointArc((-52.8, 11), (-54.5, 9.3), (-52.8, 7.6))
        make_face()
    extrude(amount=-CUT_EXTRUDE_9_DEPTH, mode=Mode.SUBTRACT)

    # 草图20<3> → 切除-拉伸10 (cut)
    with BuildSketch(Plane(origin=(0, 0, -102), x_dir=(-1, 0, 0), z_dir=(0, 0, -1))):
        with BuildLine():
            Line((-52.8, 13), (-47.2, 13))
            ThreePointArc((-47.2, 13), (-43.5, 9.3), (-47.2, 5.6))
            Line((-47.2, 5.6), (-52.8, 5.6))
            ThreePointArc((-52.8, 5.6), (-56.5, 9.3), (-52.8, 13))
        make_face()
    extrude(amount=-CUT_EXTRUDE_10_DEPTH, mode=Mode.SUBTRACT)

    # 倒角3
    # the kernel refuses this chamfer: 0.32 mm, written as the material it adds along each edge
    # the kernel refuses this chamfer: 0.32 mm, written as the material it takes off along each edge
    with BuildSketch(Plane(origin=(47.2, 5.6, -102), x_dir=(0, -0.9996219169112974, -0.027495876610561392), z_dir=(1, 0, 0))) as chamfer_3_2_piece_1_section:
        Polygon((CHAMFER_3_SIZE * 0.999621916911, -CHAMFER_3_SIZE * 0.0274958766106), (-CHAMFER_3_SIZE * 0.0274958766106, -CHAMFER_3_SIZE * 0.999621916911), (0, 0), align=None)
    chamfer_3_2_piece_1 = extrude(amount=5.6, mode=Mode.PRIVATE)
    chamfer_3_2_piece_1 = split(chamfer_3_2_piece_1, bisect_by=Plane(origin=(50, 5.492941176, -101.7), z_dir=(0, 0, -1)), keep=Keep.TOP, mode=Mode.PRIVATE)
    add(chamfer_3_2_piece_1, mode=Mode.SUBTRACT)
    with BuildSketch(Plane(origin=(47.2, 9.3, -102), x_dir=(0, 1, 0), z_dir=(1, 0, 0))) as chamfer_3_2_piece_2_section:
        Polygon((3.7 + CHAMFER_3_SIZE, 0), (3.7, CHAMFER_3_SIZE), (3.7, 0), align=None)
    chamfer_3_2_piece_2 = revolve(axis=Axis((47.2, 9.3, -102), (0, 0, 1)), revolution_arc=180, mode=Mode.PRIVATE)
    chamfer_3_2_piece_2 = split(chamfer_3_2_piece_2, bisect_by=Plane(origin=(46.708459178, 13.091931565, -101.7), z_dir=(0, 0, -1)), keep=Keep.TOP, mode=Mode.PRIVATE)
    add(chamfer_3_2_piece_2, mode=Mode.SUBTRACT)
    with BuildSketch(Plane(origin=(52.8, 13, -102), x_dir=(0, 0.9996219169112974, -0.027495876610561392), z_dir=(-1, 0, 0))) as chamfer_3_2_piece_3_section:
        Polygon((CHAMFER_3_SIZE * 0.999621916911, -CHAMFER_3_SIZE * 0.0274958766106), (-CHAMFER_3_SIZE * 0.0274958766106, -CHAMFER_3_SIZE * 0.999621916911), (0, 0), align=None)
    chamfer_3_2_piece_3 = extrude(amount=5.6, mode=Mode.PRIVATE)
    chamfer_3_2_piece_3 = split(chamfer_3_2_piece_3, bisect_by=Plane(origin=(50, 13.107058824, -101.7), z_dir=(0, 0, -1)), keep=Keep.TOP, mode=Mode.PRIVATE)
    add(chamfer_3_2_piece_3, mode=Mode.SUBTRACT)
    with BuildSketch(Plane(origin=(52.8, 9.3, -102), x_dir=(0, -1, 0), z_dir=(-1, 0, 0))) as chamfer_3_2_piece_4_section:
        Polygon((3.7 + CHAMFER_3_SIZE, 0), (3.7, CHAMFER_3_SIZE), (3.7, 0), align=None)
    chamfer_3_2_piece_4 = revolve(axis=Axis((52.8, 9.3, -102), (0, 0, 1)), revolution_arc=180, mode=Mode.PRIVATE)
    chamfer_3_2_piece_4 = split(chamfer_3_2_piece_4, bisect_by=Plane(origin=(53.291540822, 5.508068435, -101.7), z_dir=(0, 0, -1)), keep=Keep.TOP, mode=Mode.PRIVATE)
    add(chamfer_3_2_piece_4, mode=Mode.SUBTRACT)

    # 草图1<11> → 切除-拉伸12 (cut)
    with BuildSketch(Plane(origin=(0, 0, 0), x_dir=(1, 0, 0), z_dir=(0, 1, 0))):
        with Locations((30.7, 12)):
            Rectangle(SKETCH_1_11_W, SKETCH_1_11_H)
        with Locations((87.725, 55)):
            Rectangle(SKETCH_1_11_W_2, SKETCH_1_11_H)
        with Locations((37.425, 55)):
            Rectangle(SKETCH_1_11_W_2, SKETCH_1_11_H)
        with Locations((62.575, 55)):
            Rectangle(SKETCH_1_11_W_2, SKETCH_1_11_H)
        with Locations((12.275, 55)):
            Rectangle(SKETCH_1_11_W_2, SKETCH_1_11_H)
        with Locations((69.3, 12)):
            Rectangle(SKETCH_1_11_W, SKETCH_1_11_H)
    extrude(amount=CUT_EXTRUDE_12_DEPTH, mode=Mode.SUBTRACT)


solid = part.part
